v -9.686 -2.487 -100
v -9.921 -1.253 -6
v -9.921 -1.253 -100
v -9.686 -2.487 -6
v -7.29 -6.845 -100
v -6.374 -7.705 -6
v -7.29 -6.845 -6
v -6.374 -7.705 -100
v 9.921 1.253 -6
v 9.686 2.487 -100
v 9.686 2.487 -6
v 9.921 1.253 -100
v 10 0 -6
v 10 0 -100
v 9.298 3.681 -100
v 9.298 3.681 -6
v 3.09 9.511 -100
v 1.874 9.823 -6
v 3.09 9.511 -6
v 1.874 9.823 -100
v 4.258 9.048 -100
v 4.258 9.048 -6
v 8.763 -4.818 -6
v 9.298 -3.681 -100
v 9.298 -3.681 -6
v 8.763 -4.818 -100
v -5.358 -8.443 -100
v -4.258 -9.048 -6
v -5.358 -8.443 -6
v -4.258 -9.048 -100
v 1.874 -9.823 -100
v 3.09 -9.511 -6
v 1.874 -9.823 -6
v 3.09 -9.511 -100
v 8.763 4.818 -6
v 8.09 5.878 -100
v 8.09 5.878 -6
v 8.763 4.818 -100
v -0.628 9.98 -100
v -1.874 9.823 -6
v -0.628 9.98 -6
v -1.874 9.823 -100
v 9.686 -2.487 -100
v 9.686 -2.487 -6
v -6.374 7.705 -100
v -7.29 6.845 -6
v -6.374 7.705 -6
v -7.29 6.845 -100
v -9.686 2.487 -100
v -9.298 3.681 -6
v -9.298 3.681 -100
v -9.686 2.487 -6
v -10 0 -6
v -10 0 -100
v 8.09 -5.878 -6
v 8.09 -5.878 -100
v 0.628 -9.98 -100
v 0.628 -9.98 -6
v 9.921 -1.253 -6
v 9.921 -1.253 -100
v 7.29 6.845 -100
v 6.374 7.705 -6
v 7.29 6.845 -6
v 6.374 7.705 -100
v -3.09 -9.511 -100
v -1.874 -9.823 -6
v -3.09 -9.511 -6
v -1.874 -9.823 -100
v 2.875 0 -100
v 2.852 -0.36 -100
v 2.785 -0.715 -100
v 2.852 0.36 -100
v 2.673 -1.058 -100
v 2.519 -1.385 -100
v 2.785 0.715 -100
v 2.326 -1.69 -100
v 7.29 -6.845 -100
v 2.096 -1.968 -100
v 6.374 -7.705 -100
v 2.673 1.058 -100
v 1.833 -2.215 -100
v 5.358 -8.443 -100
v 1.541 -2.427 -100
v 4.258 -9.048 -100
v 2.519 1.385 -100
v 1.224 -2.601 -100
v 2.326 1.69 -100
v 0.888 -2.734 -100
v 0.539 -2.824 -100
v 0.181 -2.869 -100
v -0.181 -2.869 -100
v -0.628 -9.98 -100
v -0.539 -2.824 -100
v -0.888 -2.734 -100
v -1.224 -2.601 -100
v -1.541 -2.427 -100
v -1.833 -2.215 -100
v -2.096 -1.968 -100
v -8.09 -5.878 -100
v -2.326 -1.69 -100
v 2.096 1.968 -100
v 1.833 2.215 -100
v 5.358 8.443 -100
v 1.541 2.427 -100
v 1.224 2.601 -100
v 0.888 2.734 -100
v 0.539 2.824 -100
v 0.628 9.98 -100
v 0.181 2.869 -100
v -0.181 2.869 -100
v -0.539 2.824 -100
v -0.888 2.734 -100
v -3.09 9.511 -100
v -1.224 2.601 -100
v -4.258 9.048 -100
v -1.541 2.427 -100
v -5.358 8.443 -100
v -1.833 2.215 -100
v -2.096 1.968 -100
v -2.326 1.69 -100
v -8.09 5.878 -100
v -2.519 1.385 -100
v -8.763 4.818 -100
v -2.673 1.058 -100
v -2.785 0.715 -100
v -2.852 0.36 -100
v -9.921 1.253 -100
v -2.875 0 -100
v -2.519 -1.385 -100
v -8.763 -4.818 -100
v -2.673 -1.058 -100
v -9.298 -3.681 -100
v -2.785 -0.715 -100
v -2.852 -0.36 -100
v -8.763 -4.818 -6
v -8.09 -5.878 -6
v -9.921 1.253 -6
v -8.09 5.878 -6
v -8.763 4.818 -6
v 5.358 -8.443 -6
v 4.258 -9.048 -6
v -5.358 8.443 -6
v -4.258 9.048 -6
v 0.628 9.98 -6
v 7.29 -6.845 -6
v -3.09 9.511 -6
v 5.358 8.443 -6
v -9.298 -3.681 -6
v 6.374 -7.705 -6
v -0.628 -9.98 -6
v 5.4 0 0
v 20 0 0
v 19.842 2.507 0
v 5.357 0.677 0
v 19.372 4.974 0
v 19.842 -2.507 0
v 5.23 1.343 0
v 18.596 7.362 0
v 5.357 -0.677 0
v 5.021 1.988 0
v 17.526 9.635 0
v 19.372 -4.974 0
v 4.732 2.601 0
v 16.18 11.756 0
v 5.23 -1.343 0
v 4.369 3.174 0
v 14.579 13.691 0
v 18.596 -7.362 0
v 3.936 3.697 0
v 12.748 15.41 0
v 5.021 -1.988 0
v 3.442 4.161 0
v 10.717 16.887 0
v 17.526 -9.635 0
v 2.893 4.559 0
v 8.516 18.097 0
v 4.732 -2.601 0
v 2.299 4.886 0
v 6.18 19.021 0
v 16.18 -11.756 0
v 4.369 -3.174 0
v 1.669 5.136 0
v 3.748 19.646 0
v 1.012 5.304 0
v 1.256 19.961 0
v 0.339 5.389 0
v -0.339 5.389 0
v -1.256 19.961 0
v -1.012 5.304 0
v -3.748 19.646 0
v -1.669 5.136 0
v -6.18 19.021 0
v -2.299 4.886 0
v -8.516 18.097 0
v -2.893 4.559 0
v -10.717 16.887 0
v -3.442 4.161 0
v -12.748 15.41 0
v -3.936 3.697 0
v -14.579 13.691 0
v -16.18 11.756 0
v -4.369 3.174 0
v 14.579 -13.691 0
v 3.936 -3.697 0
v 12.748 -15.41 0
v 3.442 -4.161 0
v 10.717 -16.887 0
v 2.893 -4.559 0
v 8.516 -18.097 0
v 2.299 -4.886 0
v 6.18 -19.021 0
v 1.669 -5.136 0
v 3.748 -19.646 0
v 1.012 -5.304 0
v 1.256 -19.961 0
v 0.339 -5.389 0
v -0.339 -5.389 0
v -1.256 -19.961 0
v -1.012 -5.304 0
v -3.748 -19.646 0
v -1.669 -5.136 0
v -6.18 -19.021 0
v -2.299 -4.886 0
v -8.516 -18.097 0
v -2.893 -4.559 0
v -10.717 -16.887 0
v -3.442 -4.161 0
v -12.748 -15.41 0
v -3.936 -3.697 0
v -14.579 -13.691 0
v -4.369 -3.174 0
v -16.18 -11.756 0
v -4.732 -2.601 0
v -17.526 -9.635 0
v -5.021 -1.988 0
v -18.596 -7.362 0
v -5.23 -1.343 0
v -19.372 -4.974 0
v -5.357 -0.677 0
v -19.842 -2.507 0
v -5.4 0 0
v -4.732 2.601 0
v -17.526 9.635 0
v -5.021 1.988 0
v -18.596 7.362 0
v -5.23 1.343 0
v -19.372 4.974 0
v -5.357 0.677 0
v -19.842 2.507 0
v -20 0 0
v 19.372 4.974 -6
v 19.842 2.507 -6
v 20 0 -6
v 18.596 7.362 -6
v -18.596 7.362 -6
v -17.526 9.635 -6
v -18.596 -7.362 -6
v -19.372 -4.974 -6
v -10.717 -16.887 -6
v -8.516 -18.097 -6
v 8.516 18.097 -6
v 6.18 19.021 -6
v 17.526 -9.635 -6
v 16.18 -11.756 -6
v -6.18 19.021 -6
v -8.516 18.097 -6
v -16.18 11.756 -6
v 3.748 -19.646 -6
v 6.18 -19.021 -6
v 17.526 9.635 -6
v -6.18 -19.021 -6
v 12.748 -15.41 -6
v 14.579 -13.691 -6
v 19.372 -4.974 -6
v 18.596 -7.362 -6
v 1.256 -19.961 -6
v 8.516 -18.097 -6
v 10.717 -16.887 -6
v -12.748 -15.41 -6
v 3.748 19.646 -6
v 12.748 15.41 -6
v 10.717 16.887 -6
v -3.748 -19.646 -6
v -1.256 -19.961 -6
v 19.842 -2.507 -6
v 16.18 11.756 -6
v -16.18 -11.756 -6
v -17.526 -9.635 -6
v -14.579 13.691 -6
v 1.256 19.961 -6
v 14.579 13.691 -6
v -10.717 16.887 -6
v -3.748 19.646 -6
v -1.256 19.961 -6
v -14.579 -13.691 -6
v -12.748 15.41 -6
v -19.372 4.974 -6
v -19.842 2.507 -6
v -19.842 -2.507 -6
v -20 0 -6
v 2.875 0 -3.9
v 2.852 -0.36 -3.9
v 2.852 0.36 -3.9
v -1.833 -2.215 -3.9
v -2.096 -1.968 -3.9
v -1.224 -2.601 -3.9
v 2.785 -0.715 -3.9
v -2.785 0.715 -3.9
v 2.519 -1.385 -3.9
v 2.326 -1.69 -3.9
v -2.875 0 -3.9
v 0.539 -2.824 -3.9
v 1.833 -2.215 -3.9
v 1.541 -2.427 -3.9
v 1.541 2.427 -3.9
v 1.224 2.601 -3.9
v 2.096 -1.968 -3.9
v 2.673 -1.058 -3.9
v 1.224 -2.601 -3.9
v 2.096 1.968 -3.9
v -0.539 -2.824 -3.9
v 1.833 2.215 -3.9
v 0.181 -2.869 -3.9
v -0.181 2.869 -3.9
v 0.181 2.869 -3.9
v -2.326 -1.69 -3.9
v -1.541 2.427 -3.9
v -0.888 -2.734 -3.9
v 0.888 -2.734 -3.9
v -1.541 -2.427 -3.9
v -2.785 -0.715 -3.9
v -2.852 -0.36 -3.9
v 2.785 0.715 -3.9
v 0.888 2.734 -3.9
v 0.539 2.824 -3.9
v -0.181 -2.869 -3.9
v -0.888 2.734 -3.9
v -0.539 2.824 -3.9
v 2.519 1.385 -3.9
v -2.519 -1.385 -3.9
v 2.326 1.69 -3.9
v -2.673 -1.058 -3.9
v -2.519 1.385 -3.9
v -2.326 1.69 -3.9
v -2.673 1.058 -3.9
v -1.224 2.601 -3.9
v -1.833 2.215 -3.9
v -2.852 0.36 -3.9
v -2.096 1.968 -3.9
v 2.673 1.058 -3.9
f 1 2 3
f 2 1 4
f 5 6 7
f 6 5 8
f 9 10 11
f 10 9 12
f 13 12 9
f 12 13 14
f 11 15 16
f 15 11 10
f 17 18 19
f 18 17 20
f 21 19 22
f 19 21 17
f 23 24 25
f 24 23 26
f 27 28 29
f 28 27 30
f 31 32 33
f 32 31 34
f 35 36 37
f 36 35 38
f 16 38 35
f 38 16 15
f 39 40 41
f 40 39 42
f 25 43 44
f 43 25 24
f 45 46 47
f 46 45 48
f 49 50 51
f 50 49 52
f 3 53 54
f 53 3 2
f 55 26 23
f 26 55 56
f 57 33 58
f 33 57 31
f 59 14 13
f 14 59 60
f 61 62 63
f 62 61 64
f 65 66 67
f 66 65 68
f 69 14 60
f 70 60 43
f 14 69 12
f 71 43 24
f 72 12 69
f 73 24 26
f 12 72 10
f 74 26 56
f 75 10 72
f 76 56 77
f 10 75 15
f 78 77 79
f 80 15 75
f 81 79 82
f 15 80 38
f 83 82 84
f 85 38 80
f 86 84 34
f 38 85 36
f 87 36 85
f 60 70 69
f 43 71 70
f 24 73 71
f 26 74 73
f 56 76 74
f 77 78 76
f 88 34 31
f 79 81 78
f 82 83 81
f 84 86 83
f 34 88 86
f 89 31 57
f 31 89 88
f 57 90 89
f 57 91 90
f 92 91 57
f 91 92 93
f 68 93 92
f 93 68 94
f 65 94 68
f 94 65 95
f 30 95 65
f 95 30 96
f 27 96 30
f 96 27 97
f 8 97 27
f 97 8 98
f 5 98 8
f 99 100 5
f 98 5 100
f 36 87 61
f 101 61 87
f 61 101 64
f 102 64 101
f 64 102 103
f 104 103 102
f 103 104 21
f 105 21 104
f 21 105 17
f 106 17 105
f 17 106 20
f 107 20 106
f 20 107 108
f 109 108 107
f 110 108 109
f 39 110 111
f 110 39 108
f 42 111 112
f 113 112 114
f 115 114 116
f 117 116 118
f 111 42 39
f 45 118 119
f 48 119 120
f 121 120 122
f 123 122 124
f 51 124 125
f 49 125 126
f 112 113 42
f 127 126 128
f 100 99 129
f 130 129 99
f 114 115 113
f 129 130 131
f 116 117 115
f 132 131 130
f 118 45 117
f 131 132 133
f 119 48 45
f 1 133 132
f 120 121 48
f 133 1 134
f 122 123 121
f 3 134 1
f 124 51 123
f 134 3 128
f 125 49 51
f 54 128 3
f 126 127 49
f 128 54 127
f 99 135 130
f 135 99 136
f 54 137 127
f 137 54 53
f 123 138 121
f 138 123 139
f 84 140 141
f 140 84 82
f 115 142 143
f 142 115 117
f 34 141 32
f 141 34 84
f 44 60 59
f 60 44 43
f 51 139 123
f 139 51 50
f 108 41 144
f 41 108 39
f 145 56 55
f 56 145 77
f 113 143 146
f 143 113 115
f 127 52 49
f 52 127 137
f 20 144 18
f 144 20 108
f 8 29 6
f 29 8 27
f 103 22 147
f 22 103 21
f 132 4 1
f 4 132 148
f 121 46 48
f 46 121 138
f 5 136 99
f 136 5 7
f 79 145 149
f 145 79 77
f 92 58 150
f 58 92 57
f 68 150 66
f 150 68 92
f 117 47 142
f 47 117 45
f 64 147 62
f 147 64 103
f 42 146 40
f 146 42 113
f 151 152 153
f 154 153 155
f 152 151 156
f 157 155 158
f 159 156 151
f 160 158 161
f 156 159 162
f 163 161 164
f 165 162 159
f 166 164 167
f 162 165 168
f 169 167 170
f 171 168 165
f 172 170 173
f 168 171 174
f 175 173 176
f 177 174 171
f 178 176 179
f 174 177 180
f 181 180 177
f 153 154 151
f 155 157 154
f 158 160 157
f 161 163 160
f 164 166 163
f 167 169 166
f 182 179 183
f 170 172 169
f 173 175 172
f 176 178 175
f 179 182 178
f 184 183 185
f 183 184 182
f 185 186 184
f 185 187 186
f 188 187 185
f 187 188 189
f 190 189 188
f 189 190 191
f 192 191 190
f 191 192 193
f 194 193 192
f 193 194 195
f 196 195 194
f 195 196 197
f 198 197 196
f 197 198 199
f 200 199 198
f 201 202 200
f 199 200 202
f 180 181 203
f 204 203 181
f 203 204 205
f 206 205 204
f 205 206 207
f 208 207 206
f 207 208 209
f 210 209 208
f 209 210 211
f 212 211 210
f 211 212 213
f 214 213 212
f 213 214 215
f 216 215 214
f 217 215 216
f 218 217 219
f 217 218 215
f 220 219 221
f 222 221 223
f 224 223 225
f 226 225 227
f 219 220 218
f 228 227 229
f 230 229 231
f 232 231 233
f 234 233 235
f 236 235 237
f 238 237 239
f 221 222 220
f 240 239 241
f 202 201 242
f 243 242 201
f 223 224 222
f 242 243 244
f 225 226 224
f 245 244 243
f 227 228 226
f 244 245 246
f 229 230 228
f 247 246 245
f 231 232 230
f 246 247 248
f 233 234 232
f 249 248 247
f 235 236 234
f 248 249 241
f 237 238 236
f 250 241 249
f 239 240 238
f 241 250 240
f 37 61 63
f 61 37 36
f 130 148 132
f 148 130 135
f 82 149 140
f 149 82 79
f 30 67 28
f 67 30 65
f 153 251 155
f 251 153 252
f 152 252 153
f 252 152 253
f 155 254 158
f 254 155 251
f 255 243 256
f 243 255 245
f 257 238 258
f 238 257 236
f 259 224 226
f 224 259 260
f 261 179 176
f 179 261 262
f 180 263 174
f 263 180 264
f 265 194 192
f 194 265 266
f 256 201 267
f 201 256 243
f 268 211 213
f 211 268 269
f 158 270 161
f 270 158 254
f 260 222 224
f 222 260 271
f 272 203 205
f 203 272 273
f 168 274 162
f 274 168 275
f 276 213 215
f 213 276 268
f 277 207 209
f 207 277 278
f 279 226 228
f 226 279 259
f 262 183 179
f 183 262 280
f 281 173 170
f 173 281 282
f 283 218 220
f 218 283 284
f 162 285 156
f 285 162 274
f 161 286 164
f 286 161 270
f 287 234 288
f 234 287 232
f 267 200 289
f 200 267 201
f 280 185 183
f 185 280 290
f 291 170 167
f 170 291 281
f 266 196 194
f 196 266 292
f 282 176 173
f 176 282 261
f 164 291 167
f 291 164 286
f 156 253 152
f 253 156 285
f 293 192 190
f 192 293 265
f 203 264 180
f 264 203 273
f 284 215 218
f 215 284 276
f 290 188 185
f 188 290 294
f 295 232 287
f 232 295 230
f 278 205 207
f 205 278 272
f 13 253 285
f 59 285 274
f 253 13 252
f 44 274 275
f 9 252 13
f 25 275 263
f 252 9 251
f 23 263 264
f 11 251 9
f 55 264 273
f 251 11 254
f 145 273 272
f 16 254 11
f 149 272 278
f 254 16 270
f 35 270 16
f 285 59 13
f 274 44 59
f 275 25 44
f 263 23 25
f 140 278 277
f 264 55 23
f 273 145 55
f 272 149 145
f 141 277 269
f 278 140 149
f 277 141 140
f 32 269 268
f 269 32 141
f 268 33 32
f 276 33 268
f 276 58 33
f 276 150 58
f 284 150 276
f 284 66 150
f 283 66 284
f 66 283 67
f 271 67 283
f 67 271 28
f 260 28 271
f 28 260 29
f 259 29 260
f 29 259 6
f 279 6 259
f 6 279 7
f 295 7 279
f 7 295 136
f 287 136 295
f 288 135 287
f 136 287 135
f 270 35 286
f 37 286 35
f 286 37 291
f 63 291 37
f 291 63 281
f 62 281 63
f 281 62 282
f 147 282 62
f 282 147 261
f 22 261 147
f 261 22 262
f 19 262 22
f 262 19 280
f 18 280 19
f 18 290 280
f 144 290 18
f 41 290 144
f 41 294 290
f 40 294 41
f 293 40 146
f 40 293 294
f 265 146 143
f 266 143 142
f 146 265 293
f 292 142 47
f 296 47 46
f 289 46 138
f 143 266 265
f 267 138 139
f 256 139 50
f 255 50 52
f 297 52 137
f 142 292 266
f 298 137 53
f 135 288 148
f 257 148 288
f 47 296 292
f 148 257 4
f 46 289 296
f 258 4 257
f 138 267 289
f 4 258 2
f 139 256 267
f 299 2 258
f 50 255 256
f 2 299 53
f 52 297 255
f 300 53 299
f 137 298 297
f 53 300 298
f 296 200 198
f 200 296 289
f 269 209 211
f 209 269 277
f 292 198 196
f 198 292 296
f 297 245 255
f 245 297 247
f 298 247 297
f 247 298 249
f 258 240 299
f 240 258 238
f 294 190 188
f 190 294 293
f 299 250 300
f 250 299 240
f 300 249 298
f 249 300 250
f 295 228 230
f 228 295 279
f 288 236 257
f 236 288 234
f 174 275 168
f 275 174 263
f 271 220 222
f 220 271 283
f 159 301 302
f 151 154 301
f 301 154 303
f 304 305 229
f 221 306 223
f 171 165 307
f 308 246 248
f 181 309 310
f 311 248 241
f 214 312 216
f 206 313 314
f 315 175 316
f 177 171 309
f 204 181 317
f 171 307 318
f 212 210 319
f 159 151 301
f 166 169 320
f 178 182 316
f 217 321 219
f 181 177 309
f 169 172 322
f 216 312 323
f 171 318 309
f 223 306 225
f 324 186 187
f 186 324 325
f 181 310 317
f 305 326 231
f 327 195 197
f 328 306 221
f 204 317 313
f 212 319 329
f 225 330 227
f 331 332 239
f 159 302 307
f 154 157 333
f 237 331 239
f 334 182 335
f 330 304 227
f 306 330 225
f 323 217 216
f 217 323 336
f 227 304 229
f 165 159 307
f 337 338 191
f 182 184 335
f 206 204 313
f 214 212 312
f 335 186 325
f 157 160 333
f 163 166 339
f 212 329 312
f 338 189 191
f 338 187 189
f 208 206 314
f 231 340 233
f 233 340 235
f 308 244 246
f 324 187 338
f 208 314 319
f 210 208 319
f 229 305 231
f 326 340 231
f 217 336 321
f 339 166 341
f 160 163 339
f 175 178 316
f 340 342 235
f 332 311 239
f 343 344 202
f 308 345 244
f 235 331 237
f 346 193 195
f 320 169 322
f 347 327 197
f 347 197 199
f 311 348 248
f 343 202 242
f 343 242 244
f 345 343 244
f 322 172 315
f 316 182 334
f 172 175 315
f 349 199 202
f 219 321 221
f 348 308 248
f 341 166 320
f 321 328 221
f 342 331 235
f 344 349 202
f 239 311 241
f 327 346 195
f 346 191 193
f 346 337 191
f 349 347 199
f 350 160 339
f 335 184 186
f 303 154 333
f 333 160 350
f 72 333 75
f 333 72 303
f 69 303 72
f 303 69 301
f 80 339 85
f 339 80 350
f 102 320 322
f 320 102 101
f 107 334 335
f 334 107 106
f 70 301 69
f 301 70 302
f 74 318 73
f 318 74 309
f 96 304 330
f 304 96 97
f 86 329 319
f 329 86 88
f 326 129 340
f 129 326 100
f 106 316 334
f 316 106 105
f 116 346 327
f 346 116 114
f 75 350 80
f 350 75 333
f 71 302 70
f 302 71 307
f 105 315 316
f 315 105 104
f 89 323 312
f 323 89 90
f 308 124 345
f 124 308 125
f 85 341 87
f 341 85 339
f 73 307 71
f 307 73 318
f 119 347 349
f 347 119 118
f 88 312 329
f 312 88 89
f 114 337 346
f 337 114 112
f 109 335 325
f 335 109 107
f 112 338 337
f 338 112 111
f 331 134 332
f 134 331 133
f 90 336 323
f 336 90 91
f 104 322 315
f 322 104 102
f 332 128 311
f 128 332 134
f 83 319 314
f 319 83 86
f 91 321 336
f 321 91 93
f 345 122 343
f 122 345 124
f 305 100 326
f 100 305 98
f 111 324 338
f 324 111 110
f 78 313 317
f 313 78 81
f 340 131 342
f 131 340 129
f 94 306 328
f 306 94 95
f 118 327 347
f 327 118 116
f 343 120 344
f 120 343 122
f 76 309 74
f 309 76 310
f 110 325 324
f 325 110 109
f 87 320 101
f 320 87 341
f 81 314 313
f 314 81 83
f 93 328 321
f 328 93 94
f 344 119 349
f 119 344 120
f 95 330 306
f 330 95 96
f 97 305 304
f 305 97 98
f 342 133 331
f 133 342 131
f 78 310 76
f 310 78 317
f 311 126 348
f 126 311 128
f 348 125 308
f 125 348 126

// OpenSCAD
$fn = 50;


difference() {
	union() {
		translate(v = [0, 0, -100.0000000000]) {
			cylinder(h = 100, r = 10.0000000000);
		}
		translate(v = [0, 0, -6.0000000000]) {
			cylinder(h = 6, r = 20.0000000000);
		}
	}
	union() {
		translate(v = [0, 0, 0]) {
			rotate(a = [0, 0, 0]) {
				difference() {
					union() {
						#translate(v = [0, 0, -100.0000000000]) {
							cylinder(h = 100, r = 2.6000000000);
						}
						#translate(v = [0, 0, -3.9000000000]) {
							cylinder(h = 3.9000000000, r1 = 2.8750000000, r2 = 5.4000000000);
						}
						#translate(v = [0, 0, -100.0000000000]) {
							cylinder(h = 100, r = 2.8750000000);
						}
						#translate(v = [0, 0, -100.0000000000]) {
							cylinder(h = 100, r = 2.6000000000);
						}
					}
					union();
				}
			}
		}
	}
}
